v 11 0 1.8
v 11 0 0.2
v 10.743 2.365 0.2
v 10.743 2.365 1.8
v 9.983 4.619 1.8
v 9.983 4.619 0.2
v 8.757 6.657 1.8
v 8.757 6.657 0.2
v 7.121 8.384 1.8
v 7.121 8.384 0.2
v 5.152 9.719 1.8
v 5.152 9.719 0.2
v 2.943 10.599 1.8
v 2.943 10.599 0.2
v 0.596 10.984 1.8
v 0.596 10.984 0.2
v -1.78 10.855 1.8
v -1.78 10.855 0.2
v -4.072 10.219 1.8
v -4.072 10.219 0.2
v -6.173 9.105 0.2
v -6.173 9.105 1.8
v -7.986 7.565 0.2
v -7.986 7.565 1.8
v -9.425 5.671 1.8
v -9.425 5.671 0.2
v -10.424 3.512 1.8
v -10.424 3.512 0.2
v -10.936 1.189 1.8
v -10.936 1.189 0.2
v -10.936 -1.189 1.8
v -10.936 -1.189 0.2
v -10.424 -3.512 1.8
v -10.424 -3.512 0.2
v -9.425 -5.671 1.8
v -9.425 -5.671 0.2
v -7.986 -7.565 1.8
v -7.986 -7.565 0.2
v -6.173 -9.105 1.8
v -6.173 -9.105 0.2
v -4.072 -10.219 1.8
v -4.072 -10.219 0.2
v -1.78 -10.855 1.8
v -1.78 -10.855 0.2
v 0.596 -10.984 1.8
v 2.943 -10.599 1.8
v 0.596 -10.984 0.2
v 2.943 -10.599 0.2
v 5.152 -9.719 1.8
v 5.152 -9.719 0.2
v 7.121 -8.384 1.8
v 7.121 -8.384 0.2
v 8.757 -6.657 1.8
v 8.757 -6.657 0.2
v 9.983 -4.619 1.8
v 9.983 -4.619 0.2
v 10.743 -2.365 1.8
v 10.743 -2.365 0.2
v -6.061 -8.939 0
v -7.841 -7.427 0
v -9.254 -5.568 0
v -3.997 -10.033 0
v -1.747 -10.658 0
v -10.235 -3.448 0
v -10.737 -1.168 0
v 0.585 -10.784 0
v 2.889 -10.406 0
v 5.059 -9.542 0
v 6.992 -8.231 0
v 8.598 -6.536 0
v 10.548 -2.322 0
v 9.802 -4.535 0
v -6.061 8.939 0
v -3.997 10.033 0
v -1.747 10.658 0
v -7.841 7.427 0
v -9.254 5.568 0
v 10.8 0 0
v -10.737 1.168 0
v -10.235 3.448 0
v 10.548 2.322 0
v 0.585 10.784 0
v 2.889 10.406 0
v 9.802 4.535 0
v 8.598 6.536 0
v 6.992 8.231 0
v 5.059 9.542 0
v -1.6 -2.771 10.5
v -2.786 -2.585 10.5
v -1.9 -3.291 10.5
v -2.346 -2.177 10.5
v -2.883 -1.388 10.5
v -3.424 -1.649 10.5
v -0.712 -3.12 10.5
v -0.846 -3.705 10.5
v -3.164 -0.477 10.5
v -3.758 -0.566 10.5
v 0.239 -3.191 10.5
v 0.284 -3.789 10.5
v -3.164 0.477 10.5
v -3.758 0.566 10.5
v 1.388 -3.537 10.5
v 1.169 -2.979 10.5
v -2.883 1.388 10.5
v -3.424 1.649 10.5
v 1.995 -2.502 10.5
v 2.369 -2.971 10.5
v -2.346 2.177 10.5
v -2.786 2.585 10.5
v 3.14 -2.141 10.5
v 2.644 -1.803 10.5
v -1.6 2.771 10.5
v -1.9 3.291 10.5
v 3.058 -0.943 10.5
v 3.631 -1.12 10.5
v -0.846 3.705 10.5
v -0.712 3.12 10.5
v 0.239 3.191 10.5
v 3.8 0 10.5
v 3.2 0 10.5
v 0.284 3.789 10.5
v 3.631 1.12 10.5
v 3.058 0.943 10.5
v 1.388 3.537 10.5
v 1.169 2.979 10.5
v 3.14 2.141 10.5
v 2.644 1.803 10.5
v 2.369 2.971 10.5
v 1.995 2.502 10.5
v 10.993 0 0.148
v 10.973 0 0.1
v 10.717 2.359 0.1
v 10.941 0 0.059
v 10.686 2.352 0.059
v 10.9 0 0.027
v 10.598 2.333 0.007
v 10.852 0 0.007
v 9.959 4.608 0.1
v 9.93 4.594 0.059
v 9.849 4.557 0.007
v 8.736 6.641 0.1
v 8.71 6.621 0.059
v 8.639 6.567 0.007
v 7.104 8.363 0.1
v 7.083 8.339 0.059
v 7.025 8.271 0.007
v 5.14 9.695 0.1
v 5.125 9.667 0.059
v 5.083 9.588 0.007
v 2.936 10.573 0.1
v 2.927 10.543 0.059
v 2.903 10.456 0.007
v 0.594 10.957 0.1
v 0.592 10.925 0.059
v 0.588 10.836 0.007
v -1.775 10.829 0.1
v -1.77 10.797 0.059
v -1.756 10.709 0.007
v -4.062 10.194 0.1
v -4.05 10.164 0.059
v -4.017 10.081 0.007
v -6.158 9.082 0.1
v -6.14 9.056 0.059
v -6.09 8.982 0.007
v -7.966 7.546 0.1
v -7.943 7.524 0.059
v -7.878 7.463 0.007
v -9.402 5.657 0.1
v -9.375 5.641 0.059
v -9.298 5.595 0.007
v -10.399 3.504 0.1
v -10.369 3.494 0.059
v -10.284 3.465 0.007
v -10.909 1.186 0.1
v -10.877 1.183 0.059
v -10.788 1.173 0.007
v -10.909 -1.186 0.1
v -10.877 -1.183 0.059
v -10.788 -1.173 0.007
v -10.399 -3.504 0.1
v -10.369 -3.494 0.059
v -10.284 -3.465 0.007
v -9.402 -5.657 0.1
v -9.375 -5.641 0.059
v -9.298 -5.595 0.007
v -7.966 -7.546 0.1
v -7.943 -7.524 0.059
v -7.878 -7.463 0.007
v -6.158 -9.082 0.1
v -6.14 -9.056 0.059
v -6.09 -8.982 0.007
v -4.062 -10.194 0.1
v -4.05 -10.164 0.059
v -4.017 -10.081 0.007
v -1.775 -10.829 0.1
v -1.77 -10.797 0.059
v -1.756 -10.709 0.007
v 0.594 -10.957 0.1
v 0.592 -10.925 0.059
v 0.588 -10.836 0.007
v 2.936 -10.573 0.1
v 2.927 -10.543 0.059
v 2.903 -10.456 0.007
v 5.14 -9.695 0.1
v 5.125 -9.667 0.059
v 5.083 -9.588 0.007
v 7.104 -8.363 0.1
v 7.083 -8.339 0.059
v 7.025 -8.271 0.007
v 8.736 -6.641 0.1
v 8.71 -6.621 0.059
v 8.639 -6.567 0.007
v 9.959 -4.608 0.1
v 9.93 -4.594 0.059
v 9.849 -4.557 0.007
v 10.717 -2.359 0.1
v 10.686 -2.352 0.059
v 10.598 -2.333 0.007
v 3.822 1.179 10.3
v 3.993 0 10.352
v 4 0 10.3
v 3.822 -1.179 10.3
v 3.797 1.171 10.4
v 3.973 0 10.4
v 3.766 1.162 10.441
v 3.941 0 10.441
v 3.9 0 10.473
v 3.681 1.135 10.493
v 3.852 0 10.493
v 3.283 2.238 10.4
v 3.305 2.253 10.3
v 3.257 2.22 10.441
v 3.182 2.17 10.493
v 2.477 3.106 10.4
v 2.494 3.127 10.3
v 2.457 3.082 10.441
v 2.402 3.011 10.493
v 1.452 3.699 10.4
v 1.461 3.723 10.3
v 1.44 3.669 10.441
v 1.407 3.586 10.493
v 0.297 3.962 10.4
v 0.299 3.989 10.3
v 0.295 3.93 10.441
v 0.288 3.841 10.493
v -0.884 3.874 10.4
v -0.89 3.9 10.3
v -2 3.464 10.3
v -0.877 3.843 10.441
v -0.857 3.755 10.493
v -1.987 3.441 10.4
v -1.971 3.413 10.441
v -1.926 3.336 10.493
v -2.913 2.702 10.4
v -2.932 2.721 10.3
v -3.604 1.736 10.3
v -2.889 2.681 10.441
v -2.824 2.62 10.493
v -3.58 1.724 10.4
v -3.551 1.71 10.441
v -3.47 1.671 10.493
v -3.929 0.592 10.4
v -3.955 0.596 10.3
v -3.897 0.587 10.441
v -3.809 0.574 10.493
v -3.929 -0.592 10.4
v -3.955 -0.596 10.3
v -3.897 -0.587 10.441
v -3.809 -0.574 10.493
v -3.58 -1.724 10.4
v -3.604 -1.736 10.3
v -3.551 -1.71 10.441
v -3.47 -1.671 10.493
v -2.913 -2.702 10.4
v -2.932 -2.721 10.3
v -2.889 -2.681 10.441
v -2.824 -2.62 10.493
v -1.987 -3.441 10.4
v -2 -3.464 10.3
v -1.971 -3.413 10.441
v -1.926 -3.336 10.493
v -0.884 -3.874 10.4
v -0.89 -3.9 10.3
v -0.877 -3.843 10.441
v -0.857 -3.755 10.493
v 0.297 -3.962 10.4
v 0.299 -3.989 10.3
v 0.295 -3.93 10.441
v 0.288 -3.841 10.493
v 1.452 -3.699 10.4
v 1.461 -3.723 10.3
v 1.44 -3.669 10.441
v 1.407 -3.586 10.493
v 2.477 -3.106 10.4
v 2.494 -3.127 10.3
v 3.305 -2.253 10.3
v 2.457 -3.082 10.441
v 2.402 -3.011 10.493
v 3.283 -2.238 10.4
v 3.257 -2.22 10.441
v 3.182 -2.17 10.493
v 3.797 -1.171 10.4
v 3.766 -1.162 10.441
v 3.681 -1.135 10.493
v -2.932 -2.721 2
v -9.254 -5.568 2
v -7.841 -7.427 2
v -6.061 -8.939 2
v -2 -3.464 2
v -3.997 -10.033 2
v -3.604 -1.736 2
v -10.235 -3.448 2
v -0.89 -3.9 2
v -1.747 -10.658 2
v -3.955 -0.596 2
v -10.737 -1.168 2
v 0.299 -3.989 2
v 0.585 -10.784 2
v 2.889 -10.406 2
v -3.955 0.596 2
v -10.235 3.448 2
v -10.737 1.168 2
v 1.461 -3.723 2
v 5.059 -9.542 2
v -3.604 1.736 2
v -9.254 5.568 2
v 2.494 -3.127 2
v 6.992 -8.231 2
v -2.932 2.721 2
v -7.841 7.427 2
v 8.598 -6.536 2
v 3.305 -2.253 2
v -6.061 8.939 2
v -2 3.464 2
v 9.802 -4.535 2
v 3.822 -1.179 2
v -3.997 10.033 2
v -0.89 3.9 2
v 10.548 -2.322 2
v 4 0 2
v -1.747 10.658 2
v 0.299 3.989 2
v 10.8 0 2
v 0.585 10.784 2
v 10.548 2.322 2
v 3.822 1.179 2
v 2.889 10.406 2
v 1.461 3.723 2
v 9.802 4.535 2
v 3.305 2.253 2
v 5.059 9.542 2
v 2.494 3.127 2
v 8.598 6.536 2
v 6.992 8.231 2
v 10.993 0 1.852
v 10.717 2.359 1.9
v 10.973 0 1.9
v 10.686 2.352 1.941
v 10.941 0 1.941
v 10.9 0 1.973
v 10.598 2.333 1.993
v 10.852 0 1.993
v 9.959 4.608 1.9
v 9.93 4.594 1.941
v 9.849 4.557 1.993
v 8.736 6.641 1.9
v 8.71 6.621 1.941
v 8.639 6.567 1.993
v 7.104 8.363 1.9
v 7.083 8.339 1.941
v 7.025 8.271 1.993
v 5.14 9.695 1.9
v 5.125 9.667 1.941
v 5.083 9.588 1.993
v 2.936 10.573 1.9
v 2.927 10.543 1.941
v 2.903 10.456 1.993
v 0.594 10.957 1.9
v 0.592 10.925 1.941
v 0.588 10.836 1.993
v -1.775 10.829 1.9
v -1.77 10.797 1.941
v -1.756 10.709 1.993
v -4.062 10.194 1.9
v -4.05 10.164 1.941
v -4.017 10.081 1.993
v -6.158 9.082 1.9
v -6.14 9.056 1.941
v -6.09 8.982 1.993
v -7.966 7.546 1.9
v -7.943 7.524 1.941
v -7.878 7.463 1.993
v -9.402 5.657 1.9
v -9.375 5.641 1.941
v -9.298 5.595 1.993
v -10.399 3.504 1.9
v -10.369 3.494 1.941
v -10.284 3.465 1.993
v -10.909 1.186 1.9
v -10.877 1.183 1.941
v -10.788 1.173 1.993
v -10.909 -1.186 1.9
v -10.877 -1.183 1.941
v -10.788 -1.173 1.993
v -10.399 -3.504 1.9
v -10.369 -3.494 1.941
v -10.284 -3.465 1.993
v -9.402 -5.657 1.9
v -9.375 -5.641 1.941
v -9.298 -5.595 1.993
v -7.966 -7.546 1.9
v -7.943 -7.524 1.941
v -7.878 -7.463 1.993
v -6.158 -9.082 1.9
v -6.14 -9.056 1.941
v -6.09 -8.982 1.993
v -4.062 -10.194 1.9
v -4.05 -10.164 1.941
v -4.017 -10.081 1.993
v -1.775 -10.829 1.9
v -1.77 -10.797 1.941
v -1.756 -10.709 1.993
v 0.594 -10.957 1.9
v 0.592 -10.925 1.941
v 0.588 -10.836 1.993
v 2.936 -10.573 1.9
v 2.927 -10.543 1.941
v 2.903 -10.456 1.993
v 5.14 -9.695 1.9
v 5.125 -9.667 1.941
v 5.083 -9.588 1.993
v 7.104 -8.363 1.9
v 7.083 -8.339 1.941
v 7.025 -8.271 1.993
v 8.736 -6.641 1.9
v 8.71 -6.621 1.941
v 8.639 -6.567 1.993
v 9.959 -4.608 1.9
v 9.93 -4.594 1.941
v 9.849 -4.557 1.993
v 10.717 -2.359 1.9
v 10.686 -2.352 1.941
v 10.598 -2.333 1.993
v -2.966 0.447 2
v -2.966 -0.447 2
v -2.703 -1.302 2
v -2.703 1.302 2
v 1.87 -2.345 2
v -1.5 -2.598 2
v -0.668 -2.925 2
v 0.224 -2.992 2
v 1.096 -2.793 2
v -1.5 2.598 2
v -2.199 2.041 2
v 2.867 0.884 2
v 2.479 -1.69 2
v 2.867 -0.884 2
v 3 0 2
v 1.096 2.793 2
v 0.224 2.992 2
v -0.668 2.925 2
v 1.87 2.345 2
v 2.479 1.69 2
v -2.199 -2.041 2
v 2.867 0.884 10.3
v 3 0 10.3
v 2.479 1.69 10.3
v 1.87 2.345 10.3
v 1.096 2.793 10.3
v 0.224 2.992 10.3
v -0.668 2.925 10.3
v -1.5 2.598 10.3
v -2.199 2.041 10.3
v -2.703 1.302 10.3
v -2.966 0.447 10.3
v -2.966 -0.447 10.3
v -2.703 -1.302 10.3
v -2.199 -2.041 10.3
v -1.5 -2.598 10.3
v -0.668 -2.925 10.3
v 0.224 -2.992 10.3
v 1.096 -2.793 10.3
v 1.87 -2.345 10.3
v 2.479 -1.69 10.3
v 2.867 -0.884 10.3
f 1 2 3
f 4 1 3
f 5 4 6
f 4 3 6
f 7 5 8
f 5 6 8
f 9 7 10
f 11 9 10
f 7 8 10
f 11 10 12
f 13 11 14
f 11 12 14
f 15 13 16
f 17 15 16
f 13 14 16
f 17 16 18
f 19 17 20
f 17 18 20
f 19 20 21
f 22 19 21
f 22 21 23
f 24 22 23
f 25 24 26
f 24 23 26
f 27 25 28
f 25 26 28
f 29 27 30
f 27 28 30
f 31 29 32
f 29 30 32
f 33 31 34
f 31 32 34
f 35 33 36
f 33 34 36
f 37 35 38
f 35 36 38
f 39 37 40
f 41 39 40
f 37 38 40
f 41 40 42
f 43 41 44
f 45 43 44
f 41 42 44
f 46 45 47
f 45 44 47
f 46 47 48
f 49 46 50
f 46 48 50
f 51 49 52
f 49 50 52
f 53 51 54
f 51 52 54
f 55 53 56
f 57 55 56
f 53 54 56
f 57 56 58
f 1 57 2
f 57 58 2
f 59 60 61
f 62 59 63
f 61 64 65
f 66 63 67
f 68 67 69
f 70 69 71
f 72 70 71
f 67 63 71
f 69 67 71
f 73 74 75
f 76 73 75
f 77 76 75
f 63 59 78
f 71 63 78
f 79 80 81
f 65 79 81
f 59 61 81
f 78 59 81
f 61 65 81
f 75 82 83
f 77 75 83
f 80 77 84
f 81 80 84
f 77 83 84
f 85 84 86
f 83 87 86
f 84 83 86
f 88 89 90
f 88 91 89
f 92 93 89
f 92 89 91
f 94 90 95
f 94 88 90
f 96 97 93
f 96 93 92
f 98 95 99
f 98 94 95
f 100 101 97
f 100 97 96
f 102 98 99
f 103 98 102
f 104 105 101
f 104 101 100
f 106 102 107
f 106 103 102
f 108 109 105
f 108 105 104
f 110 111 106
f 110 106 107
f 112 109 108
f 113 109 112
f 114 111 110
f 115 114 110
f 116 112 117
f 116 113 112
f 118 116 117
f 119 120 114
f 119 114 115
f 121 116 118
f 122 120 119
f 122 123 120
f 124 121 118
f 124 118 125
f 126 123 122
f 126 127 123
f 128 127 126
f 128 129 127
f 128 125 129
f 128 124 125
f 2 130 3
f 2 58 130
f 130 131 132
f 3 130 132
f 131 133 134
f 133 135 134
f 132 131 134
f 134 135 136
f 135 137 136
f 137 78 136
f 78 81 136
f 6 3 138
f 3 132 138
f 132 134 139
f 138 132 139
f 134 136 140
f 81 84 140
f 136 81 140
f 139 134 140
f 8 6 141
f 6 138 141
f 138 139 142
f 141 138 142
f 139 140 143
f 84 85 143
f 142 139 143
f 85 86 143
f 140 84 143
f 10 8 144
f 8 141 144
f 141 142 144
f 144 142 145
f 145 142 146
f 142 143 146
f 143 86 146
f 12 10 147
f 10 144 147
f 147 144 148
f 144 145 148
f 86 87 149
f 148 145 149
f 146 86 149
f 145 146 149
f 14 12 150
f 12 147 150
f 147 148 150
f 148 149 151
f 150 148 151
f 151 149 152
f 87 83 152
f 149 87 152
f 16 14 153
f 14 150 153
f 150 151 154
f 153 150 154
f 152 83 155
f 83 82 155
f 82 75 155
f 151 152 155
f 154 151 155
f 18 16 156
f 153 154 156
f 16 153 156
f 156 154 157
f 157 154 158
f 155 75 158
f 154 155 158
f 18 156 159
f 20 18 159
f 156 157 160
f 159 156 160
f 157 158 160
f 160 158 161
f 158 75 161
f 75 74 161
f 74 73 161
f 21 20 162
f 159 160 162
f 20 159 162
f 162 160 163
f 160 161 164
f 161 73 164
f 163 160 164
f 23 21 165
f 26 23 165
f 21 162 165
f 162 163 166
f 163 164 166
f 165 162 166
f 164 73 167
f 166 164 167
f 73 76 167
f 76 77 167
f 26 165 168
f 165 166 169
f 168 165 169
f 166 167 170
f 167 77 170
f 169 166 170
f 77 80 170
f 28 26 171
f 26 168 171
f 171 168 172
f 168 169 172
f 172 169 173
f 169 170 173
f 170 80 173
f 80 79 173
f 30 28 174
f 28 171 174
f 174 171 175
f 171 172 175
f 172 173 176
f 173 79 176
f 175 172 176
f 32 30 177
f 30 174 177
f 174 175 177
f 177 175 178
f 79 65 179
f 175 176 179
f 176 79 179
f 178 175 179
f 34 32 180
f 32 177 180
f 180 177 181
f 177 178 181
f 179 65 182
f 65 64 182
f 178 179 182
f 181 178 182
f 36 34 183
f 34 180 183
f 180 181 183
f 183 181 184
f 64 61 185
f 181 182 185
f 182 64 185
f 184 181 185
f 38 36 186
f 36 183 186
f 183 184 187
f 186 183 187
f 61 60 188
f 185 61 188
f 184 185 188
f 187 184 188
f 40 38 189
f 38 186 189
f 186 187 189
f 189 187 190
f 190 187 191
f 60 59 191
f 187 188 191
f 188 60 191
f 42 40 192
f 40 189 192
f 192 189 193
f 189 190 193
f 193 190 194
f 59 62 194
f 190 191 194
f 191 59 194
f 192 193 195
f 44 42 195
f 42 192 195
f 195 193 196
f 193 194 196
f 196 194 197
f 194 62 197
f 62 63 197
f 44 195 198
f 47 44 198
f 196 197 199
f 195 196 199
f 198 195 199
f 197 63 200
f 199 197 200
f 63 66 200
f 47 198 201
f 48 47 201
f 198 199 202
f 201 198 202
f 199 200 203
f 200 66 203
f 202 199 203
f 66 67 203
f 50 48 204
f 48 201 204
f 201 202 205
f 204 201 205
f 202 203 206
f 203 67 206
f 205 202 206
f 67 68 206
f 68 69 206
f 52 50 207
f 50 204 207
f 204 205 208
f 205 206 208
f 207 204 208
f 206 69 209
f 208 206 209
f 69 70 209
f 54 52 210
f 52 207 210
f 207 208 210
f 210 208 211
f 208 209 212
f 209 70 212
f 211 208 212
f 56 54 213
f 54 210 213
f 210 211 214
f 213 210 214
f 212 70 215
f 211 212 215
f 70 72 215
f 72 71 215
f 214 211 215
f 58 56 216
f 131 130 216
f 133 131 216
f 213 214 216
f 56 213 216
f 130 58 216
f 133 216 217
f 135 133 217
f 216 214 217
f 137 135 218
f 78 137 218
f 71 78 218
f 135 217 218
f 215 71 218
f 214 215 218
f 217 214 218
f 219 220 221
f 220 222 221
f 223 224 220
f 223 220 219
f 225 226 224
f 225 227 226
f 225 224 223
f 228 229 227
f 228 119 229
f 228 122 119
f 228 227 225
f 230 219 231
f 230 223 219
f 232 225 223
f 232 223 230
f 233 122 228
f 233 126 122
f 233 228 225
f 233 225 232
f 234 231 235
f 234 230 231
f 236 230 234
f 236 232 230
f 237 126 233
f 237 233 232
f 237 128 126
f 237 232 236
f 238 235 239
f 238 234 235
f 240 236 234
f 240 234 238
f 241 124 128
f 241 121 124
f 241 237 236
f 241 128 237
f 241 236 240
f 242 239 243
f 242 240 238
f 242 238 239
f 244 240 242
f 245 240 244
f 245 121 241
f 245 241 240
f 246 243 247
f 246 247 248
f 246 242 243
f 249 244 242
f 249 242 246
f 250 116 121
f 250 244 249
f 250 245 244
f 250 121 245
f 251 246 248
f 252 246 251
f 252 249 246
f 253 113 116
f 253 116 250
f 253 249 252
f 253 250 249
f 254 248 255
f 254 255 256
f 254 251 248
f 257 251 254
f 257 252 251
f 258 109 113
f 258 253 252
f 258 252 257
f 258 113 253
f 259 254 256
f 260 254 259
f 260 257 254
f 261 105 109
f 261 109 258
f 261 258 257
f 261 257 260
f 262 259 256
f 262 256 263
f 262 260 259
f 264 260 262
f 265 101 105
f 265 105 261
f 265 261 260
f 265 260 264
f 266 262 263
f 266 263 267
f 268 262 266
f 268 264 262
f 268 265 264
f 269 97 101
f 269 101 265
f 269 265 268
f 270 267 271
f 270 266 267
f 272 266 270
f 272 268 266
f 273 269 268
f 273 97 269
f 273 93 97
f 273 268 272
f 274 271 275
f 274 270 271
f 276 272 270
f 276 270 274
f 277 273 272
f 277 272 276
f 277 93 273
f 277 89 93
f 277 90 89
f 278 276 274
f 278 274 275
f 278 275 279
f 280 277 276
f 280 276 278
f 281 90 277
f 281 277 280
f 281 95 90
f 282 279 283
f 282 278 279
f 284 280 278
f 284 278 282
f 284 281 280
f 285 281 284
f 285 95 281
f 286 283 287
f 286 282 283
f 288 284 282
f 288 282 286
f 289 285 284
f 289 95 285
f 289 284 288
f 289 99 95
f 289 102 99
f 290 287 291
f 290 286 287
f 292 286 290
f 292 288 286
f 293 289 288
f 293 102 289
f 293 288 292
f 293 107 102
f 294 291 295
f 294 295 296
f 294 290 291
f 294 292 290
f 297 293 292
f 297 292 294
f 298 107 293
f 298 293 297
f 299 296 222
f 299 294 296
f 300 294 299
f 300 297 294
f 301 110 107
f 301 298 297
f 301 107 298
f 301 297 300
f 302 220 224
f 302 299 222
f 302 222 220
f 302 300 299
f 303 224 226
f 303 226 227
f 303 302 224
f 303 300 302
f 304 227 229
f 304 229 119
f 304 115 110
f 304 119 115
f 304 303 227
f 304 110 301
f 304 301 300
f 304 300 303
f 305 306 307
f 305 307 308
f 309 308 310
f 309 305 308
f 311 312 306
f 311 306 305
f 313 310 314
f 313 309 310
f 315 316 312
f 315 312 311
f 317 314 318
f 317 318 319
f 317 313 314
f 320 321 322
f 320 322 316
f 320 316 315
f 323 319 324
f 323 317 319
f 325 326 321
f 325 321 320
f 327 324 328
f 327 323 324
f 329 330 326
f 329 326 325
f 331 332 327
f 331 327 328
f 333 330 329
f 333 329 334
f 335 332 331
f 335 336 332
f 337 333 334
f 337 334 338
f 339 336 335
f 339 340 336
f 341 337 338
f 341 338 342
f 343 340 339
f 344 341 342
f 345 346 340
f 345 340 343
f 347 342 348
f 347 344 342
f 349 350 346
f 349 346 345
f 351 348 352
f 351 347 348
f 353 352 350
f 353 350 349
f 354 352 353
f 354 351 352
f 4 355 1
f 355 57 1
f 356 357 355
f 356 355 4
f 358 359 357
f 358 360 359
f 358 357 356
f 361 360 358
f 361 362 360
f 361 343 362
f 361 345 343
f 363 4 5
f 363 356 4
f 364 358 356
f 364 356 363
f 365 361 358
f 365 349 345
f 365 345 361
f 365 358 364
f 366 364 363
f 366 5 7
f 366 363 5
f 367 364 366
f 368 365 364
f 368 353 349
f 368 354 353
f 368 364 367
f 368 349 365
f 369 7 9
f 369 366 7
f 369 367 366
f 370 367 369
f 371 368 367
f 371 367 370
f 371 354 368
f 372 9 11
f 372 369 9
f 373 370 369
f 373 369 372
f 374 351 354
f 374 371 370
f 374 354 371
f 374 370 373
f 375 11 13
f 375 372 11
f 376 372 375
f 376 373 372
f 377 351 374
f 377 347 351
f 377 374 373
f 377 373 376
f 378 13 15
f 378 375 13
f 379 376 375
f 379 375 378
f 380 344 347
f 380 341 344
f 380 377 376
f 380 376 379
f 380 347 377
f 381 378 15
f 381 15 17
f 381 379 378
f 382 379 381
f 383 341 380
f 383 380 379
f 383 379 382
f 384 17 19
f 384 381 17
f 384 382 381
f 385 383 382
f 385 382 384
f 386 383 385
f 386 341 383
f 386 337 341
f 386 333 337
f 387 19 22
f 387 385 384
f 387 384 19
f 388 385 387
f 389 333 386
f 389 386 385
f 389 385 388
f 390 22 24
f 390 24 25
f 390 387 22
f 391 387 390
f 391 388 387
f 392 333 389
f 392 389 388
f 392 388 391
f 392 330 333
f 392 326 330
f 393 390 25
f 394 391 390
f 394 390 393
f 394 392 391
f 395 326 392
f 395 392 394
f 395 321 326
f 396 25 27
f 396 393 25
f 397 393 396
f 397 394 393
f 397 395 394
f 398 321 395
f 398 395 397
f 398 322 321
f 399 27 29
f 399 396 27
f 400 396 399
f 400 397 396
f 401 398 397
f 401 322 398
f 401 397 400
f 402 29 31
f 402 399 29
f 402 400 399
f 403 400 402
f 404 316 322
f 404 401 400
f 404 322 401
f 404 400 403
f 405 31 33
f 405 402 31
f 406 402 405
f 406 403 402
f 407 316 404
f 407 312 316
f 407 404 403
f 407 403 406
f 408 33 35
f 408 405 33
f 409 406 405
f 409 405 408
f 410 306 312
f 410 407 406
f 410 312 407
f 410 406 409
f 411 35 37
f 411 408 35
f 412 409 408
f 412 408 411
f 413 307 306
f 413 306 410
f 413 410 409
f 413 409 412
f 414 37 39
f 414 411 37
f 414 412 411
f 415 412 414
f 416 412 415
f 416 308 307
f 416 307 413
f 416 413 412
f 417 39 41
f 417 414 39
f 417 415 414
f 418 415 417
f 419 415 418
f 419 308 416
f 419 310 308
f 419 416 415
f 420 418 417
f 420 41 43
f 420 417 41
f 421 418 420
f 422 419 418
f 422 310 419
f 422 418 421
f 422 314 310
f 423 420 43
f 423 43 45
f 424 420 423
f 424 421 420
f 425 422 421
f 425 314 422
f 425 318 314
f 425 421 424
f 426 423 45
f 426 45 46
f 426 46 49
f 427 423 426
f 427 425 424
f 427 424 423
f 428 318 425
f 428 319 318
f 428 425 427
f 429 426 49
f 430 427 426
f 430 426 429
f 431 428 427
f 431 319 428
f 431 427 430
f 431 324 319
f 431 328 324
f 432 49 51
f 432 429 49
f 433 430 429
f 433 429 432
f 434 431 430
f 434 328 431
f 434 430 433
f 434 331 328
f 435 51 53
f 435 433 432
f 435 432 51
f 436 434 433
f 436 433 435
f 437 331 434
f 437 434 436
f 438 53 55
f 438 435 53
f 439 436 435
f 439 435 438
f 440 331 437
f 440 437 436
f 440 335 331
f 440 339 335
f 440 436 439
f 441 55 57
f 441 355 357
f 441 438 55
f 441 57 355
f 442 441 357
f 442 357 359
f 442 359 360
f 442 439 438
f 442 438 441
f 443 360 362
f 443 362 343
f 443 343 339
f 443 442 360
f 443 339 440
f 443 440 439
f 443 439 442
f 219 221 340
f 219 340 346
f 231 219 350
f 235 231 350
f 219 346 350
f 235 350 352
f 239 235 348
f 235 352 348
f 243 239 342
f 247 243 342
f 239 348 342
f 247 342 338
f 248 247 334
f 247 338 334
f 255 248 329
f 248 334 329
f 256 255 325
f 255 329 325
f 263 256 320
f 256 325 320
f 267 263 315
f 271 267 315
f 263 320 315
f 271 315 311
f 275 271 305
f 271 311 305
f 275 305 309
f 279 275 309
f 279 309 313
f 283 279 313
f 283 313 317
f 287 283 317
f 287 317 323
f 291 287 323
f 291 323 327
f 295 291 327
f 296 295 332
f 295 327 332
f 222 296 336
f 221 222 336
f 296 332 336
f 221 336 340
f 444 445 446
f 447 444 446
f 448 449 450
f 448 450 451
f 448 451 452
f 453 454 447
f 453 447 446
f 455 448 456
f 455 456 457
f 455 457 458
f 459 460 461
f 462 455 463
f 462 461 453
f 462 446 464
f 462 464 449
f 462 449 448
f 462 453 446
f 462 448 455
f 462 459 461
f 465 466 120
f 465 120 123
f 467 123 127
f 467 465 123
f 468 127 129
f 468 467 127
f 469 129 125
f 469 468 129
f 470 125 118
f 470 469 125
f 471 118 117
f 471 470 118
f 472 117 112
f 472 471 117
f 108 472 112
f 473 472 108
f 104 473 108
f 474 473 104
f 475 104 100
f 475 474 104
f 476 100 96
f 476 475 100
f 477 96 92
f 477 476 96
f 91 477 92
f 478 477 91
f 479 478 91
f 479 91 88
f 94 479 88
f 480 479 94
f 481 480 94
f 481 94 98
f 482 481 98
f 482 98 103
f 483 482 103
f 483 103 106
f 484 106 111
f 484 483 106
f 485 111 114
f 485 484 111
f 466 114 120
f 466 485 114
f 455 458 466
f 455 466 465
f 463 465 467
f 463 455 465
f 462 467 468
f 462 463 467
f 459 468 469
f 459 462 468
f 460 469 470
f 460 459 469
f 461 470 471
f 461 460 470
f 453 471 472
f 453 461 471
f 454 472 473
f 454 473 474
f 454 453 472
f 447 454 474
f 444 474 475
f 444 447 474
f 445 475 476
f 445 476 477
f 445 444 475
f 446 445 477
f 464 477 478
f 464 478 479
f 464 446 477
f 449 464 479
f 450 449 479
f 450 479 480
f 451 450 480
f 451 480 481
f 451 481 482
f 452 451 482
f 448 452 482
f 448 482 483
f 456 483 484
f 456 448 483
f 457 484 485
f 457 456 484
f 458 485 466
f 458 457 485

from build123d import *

# Parameters (mm, degrees)
F0_R     = 11
F1_DEPTH = 2
F2_R     = 4
F2_R_2   = 3
F3_DEPTH = 8.5
F4_R     = 0.2
F5_SIZE  = 0.2


with BuildPart() as f1:
    # F0 (on Top) → F1 (new body)
    with BuildSketch(Plane.XY):
        Circle(F0_R)
    extrude(amount=F1_DEPTH)

    # F2 (on face) → F3 (join)
    with BuildSketch(Plane.XY.offset(2)):
        Circle(F2_R)
        Circle(F2_R_2, mode=Mode.SUBTRACT)
    extrude(amount=F3_DEPTH)

    # F4
    f4_edges = [f1.edges().sort_by_distance(p)[0] for p in [
        (-4, 0, 10.5),
        (-11, 0, 2),
        (-11, 0, 0),
    ]]
    fillet(f4_edges, radius=F4_R)

    # F5
    f5_edges = [f1.edges().sort_by_distance(p)[0] for p in [
        (-3, 0, 10.5),
    ]]
    chamfer(f5_edges, length=F5_SIZE)


solid = f1.part
